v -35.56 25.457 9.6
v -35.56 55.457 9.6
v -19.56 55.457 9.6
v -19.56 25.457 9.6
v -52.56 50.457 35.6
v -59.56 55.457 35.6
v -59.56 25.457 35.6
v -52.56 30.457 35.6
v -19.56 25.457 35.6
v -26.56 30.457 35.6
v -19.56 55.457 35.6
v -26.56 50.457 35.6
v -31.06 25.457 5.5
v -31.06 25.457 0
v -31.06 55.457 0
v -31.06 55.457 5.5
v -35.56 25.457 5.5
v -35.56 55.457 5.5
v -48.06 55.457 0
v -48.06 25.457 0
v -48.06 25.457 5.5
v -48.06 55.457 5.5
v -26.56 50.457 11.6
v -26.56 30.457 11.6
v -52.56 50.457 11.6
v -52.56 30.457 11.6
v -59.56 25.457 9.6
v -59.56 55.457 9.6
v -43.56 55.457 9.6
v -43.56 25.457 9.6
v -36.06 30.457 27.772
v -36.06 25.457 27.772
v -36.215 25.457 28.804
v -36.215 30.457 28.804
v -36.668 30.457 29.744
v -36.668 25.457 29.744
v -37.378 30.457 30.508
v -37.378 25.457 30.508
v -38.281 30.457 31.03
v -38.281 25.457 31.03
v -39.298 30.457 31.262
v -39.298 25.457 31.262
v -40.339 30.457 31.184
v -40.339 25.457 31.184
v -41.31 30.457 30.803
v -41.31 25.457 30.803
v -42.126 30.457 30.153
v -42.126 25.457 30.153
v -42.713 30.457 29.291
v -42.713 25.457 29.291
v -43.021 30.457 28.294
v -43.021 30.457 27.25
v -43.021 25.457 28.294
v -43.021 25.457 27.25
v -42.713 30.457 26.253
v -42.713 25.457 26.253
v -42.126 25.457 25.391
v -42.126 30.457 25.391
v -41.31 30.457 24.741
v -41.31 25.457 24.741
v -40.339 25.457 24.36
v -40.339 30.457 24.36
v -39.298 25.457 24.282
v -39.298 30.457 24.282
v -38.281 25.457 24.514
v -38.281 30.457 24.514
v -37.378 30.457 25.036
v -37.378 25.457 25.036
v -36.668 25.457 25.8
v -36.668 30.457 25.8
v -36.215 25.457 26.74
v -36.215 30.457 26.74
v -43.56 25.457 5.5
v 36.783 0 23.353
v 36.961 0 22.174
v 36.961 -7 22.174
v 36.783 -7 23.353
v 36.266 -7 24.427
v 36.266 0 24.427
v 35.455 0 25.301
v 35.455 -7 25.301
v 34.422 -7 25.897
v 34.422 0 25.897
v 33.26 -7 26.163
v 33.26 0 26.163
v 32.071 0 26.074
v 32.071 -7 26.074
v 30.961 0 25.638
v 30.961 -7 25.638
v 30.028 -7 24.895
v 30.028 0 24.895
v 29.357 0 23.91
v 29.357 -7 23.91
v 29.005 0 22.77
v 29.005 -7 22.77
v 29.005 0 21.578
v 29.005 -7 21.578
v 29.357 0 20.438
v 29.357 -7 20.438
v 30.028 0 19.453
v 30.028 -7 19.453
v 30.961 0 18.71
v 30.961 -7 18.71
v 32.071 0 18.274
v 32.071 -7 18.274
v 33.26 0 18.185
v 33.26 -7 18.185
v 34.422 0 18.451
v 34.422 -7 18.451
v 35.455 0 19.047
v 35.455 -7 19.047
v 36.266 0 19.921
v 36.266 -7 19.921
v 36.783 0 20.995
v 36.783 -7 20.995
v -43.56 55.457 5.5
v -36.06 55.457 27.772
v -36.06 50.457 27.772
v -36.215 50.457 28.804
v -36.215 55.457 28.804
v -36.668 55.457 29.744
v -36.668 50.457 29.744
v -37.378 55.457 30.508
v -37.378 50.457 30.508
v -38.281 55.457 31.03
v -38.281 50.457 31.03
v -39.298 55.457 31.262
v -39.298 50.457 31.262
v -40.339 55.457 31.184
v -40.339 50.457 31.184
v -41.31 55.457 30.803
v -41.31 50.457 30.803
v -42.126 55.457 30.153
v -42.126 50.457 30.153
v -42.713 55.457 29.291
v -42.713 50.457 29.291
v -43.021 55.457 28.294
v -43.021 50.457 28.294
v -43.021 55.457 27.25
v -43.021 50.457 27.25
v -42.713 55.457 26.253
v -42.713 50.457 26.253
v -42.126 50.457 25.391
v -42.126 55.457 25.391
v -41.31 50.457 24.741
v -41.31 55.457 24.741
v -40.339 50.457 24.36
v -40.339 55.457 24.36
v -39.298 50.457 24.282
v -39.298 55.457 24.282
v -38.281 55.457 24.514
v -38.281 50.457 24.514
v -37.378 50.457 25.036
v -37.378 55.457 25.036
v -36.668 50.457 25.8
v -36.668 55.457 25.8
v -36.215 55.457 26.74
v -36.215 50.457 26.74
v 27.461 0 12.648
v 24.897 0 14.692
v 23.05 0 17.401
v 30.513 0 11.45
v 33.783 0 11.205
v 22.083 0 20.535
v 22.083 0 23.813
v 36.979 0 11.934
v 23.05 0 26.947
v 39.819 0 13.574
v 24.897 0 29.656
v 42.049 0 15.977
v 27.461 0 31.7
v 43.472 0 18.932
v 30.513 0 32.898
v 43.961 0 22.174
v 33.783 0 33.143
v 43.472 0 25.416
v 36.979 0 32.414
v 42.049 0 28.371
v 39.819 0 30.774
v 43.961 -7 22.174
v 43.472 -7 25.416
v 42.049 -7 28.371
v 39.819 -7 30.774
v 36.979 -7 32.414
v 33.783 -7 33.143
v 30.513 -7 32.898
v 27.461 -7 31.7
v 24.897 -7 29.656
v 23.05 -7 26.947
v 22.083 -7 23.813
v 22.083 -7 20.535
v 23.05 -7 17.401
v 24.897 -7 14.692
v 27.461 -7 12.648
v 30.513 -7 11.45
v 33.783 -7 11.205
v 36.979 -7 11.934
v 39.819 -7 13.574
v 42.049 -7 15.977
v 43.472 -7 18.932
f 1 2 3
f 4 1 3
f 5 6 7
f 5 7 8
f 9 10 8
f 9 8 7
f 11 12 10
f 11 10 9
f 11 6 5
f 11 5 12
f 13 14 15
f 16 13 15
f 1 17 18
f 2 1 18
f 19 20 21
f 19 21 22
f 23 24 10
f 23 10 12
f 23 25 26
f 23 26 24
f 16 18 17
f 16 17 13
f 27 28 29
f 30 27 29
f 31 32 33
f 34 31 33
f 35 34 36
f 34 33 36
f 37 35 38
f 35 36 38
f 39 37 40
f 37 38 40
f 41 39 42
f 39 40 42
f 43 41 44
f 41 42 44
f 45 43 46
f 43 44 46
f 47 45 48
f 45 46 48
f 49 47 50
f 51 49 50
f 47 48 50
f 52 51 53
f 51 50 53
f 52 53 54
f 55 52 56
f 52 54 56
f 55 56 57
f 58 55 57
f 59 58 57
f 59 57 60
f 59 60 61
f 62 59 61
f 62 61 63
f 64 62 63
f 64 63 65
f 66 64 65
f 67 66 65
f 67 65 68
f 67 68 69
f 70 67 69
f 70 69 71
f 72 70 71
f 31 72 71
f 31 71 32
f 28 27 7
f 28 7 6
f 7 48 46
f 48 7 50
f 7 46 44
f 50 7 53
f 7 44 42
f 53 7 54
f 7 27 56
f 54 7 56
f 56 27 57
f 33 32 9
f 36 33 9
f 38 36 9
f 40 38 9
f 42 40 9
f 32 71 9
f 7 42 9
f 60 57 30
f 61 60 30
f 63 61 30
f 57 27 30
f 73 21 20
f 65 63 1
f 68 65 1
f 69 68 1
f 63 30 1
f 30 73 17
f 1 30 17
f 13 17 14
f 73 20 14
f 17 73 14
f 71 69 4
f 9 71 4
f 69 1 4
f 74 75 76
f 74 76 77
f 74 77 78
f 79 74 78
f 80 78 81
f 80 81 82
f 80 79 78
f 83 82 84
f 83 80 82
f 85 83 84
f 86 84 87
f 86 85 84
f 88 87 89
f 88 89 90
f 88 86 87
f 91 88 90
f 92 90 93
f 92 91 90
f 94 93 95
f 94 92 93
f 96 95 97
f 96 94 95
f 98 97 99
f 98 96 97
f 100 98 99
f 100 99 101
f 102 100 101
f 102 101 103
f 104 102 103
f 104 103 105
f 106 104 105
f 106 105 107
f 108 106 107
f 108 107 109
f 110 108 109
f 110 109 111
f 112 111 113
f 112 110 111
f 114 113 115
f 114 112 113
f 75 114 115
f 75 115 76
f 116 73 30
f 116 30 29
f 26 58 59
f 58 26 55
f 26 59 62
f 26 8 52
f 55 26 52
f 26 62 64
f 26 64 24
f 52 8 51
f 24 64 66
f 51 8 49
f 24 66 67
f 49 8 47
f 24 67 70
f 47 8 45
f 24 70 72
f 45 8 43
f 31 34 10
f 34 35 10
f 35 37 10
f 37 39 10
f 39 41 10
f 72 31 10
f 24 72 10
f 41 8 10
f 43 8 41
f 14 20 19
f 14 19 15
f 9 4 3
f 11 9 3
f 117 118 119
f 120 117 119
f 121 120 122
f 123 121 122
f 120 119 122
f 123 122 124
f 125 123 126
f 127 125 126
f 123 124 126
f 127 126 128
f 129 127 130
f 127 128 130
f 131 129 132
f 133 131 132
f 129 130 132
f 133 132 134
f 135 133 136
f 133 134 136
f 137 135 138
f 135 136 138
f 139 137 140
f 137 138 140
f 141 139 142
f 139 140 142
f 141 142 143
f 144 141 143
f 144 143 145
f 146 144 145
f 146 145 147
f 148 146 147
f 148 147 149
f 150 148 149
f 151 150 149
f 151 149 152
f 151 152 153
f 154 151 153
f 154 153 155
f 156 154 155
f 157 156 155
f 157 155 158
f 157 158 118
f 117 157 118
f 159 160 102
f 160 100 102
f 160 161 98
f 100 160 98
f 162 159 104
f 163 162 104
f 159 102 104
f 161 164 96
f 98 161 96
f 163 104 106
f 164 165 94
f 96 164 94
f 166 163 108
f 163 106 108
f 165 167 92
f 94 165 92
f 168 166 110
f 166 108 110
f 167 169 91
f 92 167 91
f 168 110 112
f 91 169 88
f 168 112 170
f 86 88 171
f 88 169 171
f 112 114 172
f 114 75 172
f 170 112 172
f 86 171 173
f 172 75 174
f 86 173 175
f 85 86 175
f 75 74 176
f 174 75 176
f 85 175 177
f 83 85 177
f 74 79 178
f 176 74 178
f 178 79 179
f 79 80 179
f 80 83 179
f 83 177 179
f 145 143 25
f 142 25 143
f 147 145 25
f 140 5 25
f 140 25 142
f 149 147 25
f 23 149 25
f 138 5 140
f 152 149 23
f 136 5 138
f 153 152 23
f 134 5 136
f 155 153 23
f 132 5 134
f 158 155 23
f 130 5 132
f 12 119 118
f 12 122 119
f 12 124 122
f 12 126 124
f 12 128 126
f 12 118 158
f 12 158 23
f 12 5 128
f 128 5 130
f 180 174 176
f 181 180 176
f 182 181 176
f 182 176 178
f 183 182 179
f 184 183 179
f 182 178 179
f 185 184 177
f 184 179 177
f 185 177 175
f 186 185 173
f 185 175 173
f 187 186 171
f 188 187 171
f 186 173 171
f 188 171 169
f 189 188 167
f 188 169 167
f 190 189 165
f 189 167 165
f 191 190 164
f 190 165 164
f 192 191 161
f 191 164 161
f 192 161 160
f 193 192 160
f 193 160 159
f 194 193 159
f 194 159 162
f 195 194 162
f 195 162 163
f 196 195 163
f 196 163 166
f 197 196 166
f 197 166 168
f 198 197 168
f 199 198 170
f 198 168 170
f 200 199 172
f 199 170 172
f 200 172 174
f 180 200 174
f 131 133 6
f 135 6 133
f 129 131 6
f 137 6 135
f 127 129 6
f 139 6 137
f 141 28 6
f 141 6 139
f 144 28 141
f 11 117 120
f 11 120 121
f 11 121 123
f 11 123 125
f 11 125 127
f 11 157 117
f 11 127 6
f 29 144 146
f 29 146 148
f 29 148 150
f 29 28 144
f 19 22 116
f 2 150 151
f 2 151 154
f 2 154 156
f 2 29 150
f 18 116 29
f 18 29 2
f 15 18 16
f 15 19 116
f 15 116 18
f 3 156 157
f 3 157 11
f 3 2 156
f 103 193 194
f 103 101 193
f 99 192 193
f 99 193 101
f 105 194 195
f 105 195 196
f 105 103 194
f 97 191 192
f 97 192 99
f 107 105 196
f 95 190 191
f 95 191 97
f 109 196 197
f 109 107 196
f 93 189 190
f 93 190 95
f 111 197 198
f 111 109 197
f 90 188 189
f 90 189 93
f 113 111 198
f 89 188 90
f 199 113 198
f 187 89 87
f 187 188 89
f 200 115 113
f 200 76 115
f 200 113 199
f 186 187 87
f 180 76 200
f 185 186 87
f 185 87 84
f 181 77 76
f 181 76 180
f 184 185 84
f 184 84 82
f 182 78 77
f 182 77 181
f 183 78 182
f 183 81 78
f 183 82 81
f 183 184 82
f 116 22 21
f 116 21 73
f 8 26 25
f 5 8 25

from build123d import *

# Parameters (mm, degrees)
F0_W      = 17
F0_H      = 30
F1_DEPTH  = 5.5
F2_W      = 8
F2_H      = 30
F3_DEPTH  = 4.1
F4_W      = 40
F4_H      = 30
F5_DEPTH  = 26
F6_W      = 26
F6_H      = 20
F7_DEPTH  = 24
F8_R      = 3.5
F9_DEPTH  = 30.001
F10_R     = 11
F10_R_2   = 4
F11_DEPTH = 7


with BuildPart() as f1:
    # F0 (on Top) → F1 (new body)
    with BuildSketch(Plane.XY):
        with Locations((-39.56, 40.456501)):
            Rectangle(F0_W, F0_H)
    extrude(amount=F1_DEPTH)

    # F2 (on face) → F3 (join)
    with BuildSketch(Plane.XY.offset(5.5)):
        with Locations((-39.56, 40.456501)):
            Rectangle(F2_W, F2_H)
    extrude(amount=F3_DEPTH)

    # F4 (on face) → F5 (join)
    with BuildSketch(Plane.XY.offset(9.6)):
        with Locations((-39.56, 40.456501)):
            Rectangle(F4_W, F4_H)
    extrude(amount=F5_DEPTH)

    # F6 (on face) → F7 (cut)
    with BuildSketch(Plane.XY.offset(35.6)):
        with Locations((-39.56, 40.456501)):
            Rectangle(F6_W, F6_H)
    extrude(amount=-F7_DEPTH, mode=Mode.SUBTRACT)

    # F8 (on face) → F9 (cut, through all)
    with BuildSketch(Plane.XZ.offset(-25.456501)):
        with Locations((-39.56, 27.772)):
            Circle(F8_R)
    extrude(amount=-F9_DEPTH, mode=Mode.SUBTRACT)


with BuildPart() as f11:
    # F10 (on Front) → F11 (new body)
    with BuildSketch(Plane.XZ):
        with Locations((32.960638, 22.173997)):
            Circle(F10_R)
        with Locations((32.960638, 22.173997)):
            Circle(F10_R_2, mode=Mode.SUBTRACT)
    extrude(amount=F11_DEPTH)


solid = Compound([f1.part, f11.part])
